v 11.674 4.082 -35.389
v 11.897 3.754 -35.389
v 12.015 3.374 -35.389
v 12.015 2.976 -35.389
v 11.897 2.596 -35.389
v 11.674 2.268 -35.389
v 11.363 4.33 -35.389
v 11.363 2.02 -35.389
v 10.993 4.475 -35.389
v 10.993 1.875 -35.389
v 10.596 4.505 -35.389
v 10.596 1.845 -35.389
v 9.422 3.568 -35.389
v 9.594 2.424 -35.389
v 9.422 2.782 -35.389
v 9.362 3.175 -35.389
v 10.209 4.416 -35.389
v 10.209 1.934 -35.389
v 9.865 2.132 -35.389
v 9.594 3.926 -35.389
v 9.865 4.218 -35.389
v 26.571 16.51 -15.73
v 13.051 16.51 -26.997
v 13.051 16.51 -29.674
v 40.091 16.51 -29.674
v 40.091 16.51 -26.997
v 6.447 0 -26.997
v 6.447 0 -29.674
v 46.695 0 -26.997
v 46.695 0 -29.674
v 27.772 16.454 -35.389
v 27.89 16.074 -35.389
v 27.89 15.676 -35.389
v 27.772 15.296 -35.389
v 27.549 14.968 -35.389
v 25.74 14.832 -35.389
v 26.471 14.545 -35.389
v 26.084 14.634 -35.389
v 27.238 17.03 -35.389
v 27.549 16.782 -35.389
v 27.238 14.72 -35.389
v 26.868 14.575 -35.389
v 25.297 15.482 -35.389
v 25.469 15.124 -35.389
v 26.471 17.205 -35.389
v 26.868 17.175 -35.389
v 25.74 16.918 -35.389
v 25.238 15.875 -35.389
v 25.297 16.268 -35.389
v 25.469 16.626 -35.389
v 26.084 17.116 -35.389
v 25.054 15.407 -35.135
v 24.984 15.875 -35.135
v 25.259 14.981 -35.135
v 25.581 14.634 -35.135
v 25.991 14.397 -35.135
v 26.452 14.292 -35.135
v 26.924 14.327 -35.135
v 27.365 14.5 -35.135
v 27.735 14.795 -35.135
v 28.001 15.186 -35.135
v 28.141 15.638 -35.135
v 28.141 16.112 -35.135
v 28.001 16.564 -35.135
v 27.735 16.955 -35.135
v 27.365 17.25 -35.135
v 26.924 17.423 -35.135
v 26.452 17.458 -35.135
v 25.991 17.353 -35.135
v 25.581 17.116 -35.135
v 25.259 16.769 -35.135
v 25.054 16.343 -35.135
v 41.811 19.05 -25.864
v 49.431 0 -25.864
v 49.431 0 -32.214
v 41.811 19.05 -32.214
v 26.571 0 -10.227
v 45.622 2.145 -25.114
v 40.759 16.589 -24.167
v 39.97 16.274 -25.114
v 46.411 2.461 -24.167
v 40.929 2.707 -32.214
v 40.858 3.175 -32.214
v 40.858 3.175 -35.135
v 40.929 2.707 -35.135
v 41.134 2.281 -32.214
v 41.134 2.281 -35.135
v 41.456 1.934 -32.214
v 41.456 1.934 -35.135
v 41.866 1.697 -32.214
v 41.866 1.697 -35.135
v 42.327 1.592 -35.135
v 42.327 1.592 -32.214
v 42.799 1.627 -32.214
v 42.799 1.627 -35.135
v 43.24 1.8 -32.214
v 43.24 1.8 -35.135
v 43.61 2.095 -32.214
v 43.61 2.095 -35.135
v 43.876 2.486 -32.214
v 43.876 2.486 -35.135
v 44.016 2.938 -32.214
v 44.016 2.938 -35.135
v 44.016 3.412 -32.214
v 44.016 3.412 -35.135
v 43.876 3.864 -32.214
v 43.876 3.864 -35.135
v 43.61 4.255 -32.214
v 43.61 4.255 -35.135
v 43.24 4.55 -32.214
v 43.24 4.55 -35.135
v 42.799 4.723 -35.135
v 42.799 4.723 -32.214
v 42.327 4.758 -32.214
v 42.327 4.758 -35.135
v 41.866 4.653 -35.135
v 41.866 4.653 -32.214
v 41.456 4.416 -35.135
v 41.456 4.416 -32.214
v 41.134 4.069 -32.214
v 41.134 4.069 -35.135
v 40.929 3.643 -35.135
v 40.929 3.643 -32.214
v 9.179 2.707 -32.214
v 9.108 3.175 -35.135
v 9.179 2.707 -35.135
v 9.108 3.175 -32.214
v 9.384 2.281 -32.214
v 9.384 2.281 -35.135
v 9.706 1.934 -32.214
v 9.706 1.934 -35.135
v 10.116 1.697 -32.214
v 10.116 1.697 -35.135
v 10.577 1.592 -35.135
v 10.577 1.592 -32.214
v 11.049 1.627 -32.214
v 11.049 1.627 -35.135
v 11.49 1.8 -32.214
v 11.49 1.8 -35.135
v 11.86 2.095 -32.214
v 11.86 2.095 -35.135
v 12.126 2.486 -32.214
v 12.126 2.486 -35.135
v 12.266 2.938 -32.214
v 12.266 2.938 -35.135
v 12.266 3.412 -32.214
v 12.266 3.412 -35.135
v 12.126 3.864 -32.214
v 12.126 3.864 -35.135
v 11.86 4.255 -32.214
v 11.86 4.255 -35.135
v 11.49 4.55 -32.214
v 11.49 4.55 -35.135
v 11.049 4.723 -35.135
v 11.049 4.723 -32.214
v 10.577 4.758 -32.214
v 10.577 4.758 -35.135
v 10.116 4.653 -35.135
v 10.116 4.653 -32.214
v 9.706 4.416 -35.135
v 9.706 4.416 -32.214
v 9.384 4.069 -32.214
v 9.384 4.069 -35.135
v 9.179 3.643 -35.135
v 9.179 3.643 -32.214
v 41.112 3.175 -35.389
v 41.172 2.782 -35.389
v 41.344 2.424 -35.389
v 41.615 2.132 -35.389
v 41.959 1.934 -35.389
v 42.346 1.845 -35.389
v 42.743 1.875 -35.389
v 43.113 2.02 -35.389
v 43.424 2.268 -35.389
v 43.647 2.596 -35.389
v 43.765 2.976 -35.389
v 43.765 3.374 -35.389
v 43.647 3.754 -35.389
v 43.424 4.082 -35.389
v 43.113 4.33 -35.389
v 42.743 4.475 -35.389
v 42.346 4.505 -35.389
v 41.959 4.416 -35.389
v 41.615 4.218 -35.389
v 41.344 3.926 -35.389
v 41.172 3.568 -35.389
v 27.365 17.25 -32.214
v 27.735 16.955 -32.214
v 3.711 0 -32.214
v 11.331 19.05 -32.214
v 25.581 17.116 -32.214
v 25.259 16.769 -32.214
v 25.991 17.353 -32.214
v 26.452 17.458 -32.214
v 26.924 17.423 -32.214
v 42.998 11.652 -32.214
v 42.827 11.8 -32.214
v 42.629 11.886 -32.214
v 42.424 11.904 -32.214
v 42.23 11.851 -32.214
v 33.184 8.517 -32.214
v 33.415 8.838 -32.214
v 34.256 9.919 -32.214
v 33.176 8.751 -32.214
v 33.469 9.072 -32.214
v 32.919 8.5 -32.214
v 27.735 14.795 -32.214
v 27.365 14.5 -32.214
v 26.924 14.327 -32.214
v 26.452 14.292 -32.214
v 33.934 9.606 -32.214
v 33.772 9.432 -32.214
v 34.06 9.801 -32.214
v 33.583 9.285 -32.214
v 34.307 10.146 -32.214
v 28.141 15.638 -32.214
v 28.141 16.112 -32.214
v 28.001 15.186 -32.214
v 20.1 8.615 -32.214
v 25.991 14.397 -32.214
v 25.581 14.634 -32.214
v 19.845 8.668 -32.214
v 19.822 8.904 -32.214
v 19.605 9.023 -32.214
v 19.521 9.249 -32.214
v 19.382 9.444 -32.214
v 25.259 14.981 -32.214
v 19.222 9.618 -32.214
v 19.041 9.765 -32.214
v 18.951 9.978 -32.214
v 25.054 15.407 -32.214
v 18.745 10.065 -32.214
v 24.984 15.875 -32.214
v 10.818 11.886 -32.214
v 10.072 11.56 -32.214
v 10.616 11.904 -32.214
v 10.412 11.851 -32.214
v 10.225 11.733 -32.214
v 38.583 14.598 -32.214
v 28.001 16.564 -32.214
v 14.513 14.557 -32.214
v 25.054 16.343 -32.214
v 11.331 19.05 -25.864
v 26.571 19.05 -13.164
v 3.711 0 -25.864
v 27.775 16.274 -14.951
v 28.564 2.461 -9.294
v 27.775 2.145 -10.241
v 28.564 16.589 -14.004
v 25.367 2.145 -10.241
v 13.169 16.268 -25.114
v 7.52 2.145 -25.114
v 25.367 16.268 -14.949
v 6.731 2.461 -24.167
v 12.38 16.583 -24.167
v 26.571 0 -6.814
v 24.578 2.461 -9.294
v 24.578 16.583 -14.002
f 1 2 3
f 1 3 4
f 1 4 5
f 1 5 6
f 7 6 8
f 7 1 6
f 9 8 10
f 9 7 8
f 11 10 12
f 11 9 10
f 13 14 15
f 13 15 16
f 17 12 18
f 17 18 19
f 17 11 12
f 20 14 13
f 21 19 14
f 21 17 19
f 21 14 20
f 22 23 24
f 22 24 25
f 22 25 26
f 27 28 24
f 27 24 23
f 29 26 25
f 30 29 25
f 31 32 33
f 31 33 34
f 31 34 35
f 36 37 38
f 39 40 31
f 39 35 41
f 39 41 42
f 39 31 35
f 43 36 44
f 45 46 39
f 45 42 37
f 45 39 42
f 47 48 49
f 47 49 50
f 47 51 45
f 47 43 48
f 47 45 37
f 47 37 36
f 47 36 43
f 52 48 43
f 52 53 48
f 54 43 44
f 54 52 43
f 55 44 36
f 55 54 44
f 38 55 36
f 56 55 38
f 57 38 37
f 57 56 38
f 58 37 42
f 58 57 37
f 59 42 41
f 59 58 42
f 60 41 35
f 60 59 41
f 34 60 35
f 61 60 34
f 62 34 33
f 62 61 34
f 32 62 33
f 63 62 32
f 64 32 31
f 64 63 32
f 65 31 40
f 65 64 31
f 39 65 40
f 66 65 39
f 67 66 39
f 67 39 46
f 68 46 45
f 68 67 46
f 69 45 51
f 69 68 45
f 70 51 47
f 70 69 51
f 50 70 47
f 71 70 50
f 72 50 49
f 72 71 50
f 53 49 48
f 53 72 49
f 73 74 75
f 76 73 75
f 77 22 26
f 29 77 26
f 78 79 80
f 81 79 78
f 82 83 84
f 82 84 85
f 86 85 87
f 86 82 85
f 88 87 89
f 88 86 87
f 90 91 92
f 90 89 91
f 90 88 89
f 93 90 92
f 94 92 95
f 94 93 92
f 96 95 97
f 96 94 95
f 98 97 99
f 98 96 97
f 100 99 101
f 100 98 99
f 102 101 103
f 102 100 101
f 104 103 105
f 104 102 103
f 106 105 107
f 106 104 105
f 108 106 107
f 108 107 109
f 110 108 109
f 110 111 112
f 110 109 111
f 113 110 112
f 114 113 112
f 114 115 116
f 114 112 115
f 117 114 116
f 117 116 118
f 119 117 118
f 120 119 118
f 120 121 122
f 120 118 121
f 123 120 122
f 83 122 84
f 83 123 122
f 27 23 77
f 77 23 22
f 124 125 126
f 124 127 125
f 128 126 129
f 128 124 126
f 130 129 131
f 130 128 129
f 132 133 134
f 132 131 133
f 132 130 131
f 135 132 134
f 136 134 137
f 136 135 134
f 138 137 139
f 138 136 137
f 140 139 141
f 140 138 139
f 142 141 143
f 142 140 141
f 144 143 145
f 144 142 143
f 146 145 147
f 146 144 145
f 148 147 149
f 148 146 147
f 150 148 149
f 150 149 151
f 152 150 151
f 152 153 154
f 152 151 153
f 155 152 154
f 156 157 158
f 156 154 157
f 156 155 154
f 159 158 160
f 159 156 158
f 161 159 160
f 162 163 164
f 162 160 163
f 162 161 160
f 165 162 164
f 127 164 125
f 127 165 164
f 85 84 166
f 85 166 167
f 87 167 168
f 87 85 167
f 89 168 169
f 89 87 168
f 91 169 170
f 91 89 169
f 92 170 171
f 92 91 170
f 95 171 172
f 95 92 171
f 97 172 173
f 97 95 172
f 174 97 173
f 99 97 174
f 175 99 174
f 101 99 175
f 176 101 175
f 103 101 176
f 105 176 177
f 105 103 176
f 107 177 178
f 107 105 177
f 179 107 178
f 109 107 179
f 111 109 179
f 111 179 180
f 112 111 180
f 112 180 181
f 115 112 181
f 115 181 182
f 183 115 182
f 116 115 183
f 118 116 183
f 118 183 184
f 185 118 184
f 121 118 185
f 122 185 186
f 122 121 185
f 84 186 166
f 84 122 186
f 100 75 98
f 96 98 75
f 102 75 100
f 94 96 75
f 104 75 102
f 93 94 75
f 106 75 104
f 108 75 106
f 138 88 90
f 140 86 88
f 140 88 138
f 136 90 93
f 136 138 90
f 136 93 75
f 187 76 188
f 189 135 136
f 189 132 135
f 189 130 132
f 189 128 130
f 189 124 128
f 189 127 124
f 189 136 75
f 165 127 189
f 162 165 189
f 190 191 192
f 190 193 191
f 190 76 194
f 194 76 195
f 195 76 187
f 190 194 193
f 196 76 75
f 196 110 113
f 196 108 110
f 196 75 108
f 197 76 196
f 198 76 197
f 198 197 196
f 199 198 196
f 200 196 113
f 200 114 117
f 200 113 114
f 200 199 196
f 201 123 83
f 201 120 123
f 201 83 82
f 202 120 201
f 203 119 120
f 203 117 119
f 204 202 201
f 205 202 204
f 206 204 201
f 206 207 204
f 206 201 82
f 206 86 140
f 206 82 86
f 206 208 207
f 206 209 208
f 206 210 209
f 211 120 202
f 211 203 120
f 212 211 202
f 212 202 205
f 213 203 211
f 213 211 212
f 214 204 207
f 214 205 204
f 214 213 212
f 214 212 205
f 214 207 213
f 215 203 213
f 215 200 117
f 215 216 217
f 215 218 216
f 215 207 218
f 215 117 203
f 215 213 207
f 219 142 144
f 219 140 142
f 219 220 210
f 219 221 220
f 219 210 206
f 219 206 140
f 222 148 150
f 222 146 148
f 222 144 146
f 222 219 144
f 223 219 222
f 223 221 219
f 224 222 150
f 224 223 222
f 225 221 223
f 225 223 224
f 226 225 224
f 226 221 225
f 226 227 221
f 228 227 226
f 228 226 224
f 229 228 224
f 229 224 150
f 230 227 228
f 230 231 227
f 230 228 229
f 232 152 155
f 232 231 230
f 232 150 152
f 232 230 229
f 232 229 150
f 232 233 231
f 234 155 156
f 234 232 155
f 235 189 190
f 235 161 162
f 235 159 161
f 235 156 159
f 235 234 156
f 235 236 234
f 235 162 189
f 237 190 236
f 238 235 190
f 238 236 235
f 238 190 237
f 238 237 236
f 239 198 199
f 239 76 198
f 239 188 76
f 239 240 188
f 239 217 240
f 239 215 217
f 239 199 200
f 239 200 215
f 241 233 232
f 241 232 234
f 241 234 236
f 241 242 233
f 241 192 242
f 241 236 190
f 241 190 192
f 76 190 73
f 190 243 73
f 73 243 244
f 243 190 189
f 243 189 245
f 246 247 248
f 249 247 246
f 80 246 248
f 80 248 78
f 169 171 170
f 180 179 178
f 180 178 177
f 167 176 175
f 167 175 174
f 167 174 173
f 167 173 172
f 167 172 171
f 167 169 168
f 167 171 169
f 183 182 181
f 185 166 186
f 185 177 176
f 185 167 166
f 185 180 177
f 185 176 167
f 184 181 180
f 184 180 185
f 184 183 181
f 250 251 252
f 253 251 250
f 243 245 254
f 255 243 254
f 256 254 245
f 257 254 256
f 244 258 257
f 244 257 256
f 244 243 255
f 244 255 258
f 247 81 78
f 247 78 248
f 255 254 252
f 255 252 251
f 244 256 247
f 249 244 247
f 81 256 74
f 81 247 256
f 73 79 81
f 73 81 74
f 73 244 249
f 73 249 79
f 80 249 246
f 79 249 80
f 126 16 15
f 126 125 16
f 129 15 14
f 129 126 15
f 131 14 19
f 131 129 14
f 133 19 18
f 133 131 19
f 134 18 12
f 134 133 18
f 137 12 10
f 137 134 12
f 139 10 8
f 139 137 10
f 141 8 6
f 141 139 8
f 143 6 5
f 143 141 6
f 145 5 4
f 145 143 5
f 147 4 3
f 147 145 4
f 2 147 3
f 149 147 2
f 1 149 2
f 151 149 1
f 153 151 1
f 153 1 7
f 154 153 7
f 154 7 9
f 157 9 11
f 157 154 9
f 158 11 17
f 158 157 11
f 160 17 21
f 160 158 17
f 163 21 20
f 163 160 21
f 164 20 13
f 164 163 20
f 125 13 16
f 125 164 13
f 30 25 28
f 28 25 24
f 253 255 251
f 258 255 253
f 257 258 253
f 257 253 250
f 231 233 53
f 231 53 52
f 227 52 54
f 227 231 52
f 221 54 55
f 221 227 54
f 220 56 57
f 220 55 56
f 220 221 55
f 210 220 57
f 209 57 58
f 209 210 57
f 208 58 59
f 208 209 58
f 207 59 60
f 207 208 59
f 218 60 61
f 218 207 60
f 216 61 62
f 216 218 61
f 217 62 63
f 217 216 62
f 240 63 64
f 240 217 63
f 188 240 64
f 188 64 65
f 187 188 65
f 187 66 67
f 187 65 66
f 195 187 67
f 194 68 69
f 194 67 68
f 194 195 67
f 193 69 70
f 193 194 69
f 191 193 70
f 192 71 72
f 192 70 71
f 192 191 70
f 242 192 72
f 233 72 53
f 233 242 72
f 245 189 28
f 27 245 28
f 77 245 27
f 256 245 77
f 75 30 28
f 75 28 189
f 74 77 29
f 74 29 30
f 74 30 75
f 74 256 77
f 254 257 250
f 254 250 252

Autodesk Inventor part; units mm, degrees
ref_plane "YZ Plane" through (0, 0, 0) normal (1, 0, 0) x (0, 1, 0)
ref_plane "XZ Plane" through (0, 0, 0) normal (0, 1, 0) x (-1, 0, 0)
sketch "Sketch1" plane through (0, 0, 0) normal (0, 1, 0) x (-1, 0, 0)
  line L0 (-3.711, -25.8637) -> (-3.711, -32.2137)
  line L1 (-3.711, -32.2137) -> (-49.431, -32.2137)
  line L2 (-49.431, -32.2137) -> (-49.431, -25.8637)
  line L3 (-3.711, -25.8637) -> (-26.571, -6.8137)
  line L4 (-26.571, -6.8137) -> (-49.431, -25.8637)
  point P0 (0, 0)
  dimension "d0" = 6.35
  dimension "d1" = 6.35
  dimension "d2" = 45.72
  dimension "d3" = 22.86
  dimension "d4" = 22.86
  dimension "d5" = 25.4
ref_plane "Work Plane2" through (0, 19.05, 0) normal (0, 1, 0) x (1, 0, 0)
sketch "Sketch2" plane through (0, 19.05, 0) normal (0, 1, 0) x (1, 0, 0)
  line L0 (41.811, 32.2137) -> (11.331, 32.2137)
  line L1 (11.331, 32.2137) -> (11.331, 25.8637)
  line L2 (11.331, 25.8637) -> (26.571, 13.1637)
  line L3 (26.571, 13.1637) -> (41.811, 25.8637)
  line L4 (41.811, 25.8637) -> (41.811, 32.2137)
  point P0 (0, 0)
  point P1 (26.571, 6.8137)
  dimension "d8" = 6.35
  dimension "d9" = 6.35
  dimension "d10" = 15.24
  dimension "d11" = 15.24
  dimension "d12" = 30.48
  dimension "d15" = 0
loft "Loft1" add profiles "Sketch1", "Sketch2"
shell "Shell1" thickness 2.54 removed faces 1 at (26.571, 0, -23.7471)
sketch "Sketch4" plane through (26.571, 0, -6.8137) normal (0.6201737, 0.2480695, 0.7442084) x (0.7682213, 0, -0.6401844)
  line L0 (0, 0) -> (4.0652, 19.6647) projected
  line L1 (29.7571, 0) -> (23.9032, 19.6647) projected
  line L2 (29.7571, 0) -> (0, 0) projected
  line L3 (23.9032, 19.6647) -> (4.0652, 19.6647) projected
  line L4 (3.1188, 2.54) -> (6.1338, 17.1247)
  line L5 (6.1338, 17.1247) -> (22.0092, 17.1247)
  line L6 (22.0092, 17.1247) -> (26.3508, 2.54)
  line L7 (26.3508, 2.54) -> (3.1188, 2.54)
  point P0 (-24.7744, 2.9212)
  dimension "d21" = 2.54
  dimension "d22" = 2.54
  dimension "d23" = 2.54
  dimension "d24" = 2.54
extrude "Extrusion2" cut sketch "Sketch4" against normal blind 1.27 contours L4 L5 L6 L7
sketch "Sketch5" plane through (3.711, 0, -25.8637) normal (-0.6201737, 0.2480695, 0.7442084) x (0.7682213, 0, 0.6401844)
  line L0 (29.7571, 0) -> (0, 0)
  line L1 (24.1888, 19.6583) -> (4.3507, 19.6583)
  line L2 (3.4063, 2.54) -> (7.746, 17.1183)
  line L3 (7.746, 17.1183) -> (23.6246, 17.1183)
  line L4 (23.6246, 17.1183) -> (26.6383, 2.54)
  line L5 (26.6383, 2.54) -> (3.4063, 2.54)
  line L6 (0, 0) -> (5.8538, 19.6647) projected
  line L7 (29.7571, 0) -> (25.6919, 19.6647) projected
  point P0 (13.7067, -5.5182)
  point P1 (-24.7744, 2.9212)
  dimension "d27" = 2.54
  dimension "d29" = 2.54
  dimension "d32" = 2.54
  dimension "d34" = 2.54
extrude "Extrusion3" cut sketch "Sketch5" against normal blind 1.27
sketch "Sketch6" plane through (49.431, 0, -32.2137) normal (0, 0, -1) x (-1, 0, 0)
  circle A0 centre (6.985, 3.175) radius 1.5875
  circle A1 centre (22.86, 15.875) radius 1.5875
  circle A2 centre (38.735, 3.175) radius 1.5875
  line L0 (0, 0) -> (7.62, 19.05) projected
  line L1 (45.72, 0) -> (0, 0) projected
  line L2 (45.72, 0) -> (38.1, 19.05) projected
  line L3 (38.1, 19.05) -> (7.62, 19.05) projected
  point P0 (49.431, 0)
  dimension "d37" = 6.985
  dimension "d38" = 6.985
  dimension "d39" = 3.175
  dimension "d40" = 3.175
  dimension "d41" = 3.175
  dimension "d42" = 22.86
  dimension "d43" = 3.175
  dimension "d44" = 3.175
  dimension "d45" = 3.175
extrude "Extrusion4" add sketch "Sketch6" along normal blind 3.175 contours A0 | A1 | A2
chamfer "Chamfer1" distance 0.254 angle 45 3 edges at (44.0335, 3.175, -35.3887) (28.1585, 15.875, -35.3887) (12.2835, 3.175, -35.3887)
properties part number "Cow Catcher"
